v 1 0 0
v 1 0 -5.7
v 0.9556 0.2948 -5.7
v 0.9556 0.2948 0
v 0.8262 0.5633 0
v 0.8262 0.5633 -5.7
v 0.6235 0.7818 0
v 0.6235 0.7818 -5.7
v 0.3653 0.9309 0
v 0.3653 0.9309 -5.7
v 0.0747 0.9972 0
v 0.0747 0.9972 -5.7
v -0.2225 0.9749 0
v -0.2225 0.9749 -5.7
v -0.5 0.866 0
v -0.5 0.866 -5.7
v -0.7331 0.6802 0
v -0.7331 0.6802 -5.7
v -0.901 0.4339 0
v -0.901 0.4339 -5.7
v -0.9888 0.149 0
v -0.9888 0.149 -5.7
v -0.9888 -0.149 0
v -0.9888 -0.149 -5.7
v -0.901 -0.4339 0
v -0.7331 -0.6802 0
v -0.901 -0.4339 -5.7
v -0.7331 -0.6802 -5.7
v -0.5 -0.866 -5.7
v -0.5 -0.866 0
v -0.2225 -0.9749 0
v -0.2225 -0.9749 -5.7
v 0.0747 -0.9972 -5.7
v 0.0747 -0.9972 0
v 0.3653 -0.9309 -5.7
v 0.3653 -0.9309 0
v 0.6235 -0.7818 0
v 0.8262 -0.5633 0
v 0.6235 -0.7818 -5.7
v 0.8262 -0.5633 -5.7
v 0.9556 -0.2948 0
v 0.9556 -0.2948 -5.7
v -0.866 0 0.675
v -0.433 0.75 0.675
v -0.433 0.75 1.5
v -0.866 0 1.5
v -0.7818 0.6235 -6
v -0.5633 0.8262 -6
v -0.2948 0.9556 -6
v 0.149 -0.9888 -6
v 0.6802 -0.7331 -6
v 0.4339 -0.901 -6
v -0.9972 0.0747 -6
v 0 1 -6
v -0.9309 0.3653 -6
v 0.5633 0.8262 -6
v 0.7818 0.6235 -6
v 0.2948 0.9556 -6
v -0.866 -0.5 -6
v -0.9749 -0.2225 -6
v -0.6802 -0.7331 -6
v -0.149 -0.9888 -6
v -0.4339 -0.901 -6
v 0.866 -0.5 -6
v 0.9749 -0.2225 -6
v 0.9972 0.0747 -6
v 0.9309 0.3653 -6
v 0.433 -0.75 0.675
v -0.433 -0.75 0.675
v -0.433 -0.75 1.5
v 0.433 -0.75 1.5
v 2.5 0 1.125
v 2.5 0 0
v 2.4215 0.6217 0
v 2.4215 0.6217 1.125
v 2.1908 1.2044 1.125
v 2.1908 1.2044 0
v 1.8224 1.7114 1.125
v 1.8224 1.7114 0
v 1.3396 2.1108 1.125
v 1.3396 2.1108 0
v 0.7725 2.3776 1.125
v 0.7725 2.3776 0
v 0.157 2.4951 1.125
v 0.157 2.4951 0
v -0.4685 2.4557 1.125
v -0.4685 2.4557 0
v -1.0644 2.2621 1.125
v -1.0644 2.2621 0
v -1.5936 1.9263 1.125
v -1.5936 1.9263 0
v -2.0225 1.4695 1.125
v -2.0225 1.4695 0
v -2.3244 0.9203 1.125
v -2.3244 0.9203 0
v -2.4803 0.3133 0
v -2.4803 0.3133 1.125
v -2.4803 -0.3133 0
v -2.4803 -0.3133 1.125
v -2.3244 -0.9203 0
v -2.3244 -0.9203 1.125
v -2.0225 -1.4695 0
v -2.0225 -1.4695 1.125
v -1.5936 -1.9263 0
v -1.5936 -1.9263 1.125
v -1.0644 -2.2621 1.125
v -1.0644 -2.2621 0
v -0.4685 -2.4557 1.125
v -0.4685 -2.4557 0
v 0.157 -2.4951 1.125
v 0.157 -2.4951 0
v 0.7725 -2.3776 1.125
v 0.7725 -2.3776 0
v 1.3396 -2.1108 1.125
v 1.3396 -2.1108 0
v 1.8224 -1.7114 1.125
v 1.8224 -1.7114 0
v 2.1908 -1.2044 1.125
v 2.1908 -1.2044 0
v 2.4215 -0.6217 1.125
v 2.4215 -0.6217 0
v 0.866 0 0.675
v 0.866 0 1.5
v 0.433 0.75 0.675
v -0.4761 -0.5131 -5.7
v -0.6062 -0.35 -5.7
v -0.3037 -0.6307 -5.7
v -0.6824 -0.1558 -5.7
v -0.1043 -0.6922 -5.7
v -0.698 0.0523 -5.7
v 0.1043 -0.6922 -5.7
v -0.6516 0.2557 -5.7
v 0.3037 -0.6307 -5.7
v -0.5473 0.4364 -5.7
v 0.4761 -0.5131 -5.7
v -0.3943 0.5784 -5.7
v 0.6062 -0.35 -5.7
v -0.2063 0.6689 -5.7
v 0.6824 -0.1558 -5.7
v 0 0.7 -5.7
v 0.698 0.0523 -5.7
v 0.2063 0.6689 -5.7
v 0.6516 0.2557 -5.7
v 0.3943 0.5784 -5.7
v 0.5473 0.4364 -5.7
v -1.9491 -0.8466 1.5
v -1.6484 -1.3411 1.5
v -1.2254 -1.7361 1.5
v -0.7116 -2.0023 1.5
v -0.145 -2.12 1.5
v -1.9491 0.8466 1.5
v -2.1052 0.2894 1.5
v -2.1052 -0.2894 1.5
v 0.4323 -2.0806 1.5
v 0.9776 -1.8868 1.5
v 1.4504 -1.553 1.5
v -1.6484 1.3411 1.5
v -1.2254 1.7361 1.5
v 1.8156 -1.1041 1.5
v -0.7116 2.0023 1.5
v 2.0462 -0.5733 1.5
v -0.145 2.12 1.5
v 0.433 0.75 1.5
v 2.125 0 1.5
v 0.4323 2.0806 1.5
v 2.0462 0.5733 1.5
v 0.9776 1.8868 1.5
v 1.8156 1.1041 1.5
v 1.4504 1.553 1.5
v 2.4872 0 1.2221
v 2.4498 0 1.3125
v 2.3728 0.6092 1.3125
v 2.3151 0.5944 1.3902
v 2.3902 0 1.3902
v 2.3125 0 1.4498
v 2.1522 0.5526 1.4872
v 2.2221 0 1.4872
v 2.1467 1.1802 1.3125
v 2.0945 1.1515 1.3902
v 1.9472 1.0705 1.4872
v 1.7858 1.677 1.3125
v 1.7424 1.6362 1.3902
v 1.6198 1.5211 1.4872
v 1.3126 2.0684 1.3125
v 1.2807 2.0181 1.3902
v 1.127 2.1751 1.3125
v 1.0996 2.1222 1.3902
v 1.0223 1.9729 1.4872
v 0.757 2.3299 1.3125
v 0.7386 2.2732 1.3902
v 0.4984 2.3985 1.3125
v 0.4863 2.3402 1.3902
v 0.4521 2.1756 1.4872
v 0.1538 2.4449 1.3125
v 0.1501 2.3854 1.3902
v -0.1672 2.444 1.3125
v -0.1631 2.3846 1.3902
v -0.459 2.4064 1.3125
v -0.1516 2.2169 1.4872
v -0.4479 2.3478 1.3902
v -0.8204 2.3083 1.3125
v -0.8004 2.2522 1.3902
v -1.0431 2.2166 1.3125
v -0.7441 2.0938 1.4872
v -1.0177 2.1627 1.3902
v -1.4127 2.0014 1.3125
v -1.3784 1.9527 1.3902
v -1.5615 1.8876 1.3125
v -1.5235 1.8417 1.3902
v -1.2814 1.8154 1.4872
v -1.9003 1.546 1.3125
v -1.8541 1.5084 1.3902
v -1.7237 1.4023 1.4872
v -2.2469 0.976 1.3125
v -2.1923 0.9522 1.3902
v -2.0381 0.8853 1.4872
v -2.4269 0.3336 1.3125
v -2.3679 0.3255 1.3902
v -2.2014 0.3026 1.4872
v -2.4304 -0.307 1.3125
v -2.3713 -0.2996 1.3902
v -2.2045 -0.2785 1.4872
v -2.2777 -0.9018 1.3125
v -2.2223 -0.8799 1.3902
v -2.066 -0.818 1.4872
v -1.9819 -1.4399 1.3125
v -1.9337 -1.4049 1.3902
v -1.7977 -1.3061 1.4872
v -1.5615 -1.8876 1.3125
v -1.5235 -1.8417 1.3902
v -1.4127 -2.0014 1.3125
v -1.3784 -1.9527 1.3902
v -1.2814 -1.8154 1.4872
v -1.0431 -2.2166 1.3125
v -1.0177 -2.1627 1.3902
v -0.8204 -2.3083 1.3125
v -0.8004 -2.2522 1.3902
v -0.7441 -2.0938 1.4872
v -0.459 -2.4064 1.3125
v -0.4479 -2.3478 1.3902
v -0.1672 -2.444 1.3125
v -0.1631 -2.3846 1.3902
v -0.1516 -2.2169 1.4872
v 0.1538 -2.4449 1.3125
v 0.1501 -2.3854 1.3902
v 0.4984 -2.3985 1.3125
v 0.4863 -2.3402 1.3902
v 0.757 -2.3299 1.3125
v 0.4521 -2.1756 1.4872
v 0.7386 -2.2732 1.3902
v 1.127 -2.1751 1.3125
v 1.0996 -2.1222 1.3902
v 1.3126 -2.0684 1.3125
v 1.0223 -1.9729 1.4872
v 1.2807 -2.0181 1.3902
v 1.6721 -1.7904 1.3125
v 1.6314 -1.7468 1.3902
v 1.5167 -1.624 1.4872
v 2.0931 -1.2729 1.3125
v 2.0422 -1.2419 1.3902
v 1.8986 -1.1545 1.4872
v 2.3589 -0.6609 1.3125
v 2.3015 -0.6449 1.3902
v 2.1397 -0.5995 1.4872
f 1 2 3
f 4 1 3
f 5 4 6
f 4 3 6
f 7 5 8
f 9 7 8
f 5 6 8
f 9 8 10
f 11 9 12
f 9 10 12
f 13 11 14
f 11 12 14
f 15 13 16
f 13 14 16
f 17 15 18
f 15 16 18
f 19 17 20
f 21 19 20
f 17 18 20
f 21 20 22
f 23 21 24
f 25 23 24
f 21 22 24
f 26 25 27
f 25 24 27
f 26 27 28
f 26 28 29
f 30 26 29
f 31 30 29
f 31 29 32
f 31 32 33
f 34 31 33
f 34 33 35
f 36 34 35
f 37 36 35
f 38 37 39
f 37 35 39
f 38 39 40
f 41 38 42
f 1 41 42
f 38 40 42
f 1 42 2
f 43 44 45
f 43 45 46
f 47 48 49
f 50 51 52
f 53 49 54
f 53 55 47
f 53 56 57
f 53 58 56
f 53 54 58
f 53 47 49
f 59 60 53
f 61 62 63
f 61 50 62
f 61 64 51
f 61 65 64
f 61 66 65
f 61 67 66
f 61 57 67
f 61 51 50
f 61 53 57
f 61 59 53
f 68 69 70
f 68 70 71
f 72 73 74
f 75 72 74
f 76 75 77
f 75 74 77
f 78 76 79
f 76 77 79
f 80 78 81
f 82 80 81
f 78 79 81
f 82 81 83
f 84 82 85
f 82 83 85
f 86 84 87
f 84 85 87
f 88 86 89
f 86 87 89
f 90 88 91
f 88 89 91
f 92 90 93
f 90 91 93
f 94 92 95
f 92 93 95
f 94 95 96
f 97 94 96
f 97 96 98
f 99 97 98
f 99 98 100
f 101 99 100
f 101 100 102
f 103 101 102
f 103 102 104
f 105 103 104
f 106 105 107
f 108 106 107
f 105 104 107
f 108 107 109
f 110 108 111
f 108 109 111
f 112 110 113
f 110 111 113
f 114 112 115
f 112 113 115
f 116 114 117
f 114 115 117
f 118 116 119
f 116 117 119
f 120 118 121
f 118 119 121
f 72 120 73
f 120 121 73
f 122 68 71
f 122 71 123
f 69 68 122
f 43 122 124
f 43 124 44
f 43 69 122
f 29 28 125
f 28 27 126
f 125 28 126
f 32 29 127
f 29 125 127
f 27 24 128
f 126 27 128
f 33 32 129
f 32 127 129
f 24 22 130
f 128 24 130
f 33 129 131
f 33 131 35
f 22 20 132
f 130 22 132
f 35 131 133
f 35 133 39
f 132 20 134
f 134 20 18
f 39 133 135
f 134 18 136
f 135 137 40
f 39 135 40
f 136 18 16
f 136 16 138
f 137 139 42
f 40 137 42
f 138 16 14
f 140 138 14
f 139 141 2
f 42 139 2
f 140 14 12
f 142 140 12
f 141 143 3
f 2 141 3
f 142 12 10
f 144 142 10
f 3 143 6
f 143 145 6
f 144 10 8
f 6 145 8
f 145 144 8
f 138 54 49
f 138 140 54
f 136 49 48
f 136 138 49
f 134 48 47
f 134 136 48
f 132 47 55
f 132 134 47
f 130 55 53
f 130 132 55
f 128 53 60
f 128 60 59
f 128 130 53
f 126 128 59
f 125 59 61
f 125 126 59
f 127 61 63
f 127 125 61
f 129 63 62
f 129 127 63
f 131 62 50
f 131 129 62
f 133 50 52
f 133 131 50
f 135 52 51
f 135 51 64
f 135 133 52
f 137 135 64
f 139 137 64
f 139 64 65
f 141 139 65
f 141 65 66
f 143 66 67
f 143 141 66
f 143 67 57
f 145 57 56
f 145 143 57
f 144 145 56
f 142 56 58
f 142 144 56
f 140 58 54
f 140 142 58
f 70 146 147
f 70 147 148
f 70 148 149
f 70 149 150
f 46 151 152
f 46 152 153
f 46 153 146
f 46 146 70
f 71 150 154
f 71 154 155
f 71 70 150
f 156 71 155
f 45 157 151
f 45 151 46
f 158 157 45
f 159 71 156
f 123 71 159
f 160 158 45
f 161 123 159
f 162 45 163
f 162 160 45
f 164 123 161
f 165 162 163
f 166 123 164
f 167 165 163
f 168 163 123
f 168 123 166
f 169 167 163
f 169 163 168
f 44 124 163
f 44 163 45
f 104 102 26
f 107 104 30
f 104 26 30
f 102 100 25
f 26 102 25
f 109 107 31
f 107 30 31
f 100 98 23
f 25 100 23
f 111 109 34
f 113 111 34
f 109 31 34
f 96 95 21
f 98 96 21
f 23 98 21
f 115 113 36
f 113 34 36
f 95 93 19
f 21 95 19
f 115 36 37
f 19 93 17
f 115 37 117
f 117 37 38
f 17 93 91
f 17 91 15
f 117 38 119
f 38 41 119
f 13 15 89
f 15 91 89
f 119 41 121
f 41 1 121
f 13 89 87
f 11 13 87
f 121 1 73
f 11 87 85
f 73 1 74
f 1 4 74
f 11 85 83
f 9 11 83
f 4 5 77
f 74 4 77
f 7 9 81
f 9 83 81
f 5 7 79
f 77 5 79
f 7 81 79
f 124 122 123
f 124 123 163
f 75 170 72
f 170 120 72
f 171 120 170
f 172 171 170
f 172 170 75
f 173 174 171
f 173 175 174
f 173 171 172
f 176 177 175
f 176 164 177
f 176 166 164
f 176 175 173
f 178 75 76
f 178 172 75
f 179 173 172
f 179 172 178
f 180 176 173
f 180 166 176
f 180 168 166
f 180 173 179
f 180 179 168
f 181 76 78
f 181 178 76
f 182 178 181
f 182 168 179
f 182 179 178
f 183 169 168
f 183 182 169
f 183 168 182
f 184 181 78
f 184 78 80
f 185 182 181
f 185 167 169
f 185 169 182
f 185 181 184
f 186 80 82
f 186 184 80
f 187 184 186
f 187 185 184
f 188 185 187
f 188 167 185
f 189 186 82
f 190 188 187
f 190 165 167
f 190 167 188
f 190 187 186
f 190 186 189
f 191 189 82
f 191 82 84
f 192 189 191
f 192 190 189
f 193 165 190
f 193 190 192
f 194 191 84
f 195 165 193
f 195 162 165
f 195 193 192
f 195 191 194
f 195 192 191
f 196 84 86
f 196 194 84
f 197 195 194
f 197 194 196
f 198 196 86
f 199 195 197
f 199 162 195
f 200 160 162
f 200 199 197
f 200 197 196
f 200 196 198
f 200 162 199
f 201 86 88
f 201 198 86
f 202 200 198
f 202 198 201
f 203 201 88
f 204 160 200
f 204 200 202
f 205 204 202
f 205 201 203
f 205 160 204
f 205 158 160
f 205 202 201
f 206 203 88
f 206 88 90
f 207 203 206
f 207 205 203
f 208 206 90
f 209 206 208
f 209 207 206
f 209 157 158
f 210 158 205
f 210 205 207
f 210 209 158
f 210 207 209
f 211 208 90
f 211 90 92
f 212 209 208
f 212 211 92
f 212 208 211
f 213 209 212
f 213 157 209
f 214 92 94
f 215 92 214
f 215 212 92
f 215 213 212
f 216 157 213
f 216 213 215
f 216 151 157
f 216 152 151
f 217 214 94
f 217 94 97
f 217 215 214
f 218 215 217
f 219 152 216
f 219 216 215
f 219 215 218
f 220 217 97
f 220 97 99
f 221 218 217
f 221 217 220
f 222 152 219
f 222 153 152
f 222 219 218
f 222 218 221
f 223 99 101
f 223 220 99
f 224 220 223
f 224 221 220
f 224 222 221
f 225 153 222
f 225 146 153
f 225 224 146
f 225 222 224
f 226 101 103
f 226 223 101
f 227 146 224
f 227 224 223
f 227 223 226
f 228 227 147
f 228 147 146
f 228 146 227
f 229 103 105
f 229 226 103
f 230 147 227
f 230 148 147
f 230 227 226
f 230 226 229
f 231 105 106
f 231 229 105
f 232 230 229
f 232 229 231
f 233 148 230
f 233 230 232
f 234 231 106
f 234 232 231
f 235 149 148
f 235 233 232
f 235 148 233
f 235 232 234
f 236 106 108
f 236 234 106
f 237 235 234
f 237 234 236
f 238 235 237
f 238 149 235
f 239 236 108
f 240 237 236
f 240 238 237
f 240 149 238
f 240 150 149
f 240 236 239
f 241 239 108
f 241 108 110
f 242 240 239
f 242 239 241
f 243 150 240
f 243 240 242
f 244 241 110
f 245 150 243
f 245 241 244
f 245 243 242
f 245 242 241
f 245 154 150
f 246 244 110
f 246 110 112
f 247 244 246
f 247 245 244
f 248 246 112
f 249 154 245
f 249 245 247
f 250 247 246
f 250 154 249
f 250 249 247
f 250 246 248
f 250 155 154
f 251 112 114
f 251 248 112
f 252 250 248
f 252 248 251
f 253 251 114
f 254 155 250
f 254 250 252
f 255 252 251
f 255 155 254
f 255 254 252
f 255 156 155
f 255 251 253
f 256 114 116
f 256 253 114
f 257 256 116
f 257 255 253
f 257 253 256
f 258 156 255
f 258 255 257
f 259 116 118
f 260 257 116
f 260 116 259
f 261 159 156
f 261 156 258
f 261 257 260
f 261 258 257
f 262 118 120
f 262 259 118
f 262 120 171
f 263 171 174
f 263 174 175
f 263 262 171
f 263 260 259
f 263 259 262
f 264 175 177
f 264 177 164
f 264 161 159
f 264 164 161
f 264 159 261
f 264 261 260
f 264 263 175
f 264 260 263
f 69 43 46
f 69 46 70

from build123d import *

# Parameters (mm, degrees)
F_0135_CYLINDER_SKETCH_R    = 2.5
F_0135_CYLINDER_DEPTH       = 1.5
F_0136_FILLET_R             = 0.375
F_0137_EXTRUDE_DEPTH        = 0.835
F_0137_EXTRUDE_ROTATE_ANGLE = 120
F_0140_CYLINDER_SKETCH_R    = 1
F_0140_CYLINDER_DEPTH       = 5.7
F_0141_CONE_ROTATE_ANGLE    = 90


with BuildPart() as part:
    # 0135_cylinder_Sketch → 0135_cylinder (new body)
    with BuildSketch(Plane.XY):
        Circle(F_0135_CYLINDER_SKETCH_R)
    extrude(amount=F_0135_CYLINDER_DEPTH)

    # 0136_fillet
    f_0136_fillet_edges = [part.edges().sort_by_distance(p)[0] for p in [
        (-2.5, 0, 1.5),
    ]]
    fillet(f_0136_fillet_edges, radius=F_0136_FILLET_R)


with BuildPart() as body_2:
    # 0137_extrude_Sketch → 0137_extrude (new body)
    with BuildSketch(Plane.XY):
        Polygon((0, 0), (0.866025404, 0), (1.299038106, 0.75), (0.866025404, 1.5), (0, 1.5), (-0.433012702, 0.75), align=None)
    extrude(amount=F_0137_EXTRUDE_DEPTH)


with BuildPart() as body_2_1:
    # 0137_extrude_Rotate: read off the stored shape, not the designer's step
    # 0137_extrude_Rotate: moved
    add(body_2.part.rotate(Axis((0, 0, 0), (0, 0, 1)), F_0137_EXTRUDE_ROTATE_ANGLE))


with BuildPart() as body_2_2:
    # 0137_extrude_Translate: moved
    add(body_2_1.part.moved(Location((0.866025404, 0, 0.675))))


with BuildPart() as part_1:
    add(part.part)

    # 0139_sub: cut body 2
    add(body_2_2.part, mode=Mode.SUBTRACT)


with BuildPart() as body_2_2_1:
    # 0140_cylinder_Sketch → 0140_cylinder (new body)
    with BuildSketch(Plane.XY):
        Circle(F_0140_CYLINDER_SKETCH_R)
    extrude(amount=F_0140_CYLINDER_DEPTH)


with BuildPart() as body_2_2_2:
    # 0140_cylinder_Translate: moved
    add(body_2_2_1.part.moved(Location((0, 0, -5.7))))


with BuildPart() as body_3:
    # 0141_cone_Sketch → 0141_cone (revolve)
    with BuildSketch(Plane.XY, mode=Mode.PRIVATE) as f_0141_cone_sk:
        Polygon((0, 0), (1, 0), (0.7, 0.3), (0, 0.3), align=None)
    revolve(f_0141_cone_sk.sketch.rotate(Axis((0, -100, 0), (0, 1, 0)), 90), axis=Axis((0, -100, 0), (0, 1, 0)))


with BuildPart() as body_3_1:
    # 0141_cone_Rotate: moved
    add(body_3.part.rotate(Axis((0, 0, 0), (1, 0, 0)), F_0141_CONE_ROTATE_ANGLE))


with BuildPart() as body_3_2:
    # 0141_cone_Translate: moved
    add(body_3_1.part.moved(Location((0, 0, -6))))


with BuildPart() as body_2_2_3:
    add(body_2_2_2.part)

    # 0143_add: union body 3
    add(body_3_2.part)


with BuildPart() as part_2:
    add(part_1.part)

    # 0144_add: union body 2 2
    add(body_2_2_3.part)


solid = part_2.part
